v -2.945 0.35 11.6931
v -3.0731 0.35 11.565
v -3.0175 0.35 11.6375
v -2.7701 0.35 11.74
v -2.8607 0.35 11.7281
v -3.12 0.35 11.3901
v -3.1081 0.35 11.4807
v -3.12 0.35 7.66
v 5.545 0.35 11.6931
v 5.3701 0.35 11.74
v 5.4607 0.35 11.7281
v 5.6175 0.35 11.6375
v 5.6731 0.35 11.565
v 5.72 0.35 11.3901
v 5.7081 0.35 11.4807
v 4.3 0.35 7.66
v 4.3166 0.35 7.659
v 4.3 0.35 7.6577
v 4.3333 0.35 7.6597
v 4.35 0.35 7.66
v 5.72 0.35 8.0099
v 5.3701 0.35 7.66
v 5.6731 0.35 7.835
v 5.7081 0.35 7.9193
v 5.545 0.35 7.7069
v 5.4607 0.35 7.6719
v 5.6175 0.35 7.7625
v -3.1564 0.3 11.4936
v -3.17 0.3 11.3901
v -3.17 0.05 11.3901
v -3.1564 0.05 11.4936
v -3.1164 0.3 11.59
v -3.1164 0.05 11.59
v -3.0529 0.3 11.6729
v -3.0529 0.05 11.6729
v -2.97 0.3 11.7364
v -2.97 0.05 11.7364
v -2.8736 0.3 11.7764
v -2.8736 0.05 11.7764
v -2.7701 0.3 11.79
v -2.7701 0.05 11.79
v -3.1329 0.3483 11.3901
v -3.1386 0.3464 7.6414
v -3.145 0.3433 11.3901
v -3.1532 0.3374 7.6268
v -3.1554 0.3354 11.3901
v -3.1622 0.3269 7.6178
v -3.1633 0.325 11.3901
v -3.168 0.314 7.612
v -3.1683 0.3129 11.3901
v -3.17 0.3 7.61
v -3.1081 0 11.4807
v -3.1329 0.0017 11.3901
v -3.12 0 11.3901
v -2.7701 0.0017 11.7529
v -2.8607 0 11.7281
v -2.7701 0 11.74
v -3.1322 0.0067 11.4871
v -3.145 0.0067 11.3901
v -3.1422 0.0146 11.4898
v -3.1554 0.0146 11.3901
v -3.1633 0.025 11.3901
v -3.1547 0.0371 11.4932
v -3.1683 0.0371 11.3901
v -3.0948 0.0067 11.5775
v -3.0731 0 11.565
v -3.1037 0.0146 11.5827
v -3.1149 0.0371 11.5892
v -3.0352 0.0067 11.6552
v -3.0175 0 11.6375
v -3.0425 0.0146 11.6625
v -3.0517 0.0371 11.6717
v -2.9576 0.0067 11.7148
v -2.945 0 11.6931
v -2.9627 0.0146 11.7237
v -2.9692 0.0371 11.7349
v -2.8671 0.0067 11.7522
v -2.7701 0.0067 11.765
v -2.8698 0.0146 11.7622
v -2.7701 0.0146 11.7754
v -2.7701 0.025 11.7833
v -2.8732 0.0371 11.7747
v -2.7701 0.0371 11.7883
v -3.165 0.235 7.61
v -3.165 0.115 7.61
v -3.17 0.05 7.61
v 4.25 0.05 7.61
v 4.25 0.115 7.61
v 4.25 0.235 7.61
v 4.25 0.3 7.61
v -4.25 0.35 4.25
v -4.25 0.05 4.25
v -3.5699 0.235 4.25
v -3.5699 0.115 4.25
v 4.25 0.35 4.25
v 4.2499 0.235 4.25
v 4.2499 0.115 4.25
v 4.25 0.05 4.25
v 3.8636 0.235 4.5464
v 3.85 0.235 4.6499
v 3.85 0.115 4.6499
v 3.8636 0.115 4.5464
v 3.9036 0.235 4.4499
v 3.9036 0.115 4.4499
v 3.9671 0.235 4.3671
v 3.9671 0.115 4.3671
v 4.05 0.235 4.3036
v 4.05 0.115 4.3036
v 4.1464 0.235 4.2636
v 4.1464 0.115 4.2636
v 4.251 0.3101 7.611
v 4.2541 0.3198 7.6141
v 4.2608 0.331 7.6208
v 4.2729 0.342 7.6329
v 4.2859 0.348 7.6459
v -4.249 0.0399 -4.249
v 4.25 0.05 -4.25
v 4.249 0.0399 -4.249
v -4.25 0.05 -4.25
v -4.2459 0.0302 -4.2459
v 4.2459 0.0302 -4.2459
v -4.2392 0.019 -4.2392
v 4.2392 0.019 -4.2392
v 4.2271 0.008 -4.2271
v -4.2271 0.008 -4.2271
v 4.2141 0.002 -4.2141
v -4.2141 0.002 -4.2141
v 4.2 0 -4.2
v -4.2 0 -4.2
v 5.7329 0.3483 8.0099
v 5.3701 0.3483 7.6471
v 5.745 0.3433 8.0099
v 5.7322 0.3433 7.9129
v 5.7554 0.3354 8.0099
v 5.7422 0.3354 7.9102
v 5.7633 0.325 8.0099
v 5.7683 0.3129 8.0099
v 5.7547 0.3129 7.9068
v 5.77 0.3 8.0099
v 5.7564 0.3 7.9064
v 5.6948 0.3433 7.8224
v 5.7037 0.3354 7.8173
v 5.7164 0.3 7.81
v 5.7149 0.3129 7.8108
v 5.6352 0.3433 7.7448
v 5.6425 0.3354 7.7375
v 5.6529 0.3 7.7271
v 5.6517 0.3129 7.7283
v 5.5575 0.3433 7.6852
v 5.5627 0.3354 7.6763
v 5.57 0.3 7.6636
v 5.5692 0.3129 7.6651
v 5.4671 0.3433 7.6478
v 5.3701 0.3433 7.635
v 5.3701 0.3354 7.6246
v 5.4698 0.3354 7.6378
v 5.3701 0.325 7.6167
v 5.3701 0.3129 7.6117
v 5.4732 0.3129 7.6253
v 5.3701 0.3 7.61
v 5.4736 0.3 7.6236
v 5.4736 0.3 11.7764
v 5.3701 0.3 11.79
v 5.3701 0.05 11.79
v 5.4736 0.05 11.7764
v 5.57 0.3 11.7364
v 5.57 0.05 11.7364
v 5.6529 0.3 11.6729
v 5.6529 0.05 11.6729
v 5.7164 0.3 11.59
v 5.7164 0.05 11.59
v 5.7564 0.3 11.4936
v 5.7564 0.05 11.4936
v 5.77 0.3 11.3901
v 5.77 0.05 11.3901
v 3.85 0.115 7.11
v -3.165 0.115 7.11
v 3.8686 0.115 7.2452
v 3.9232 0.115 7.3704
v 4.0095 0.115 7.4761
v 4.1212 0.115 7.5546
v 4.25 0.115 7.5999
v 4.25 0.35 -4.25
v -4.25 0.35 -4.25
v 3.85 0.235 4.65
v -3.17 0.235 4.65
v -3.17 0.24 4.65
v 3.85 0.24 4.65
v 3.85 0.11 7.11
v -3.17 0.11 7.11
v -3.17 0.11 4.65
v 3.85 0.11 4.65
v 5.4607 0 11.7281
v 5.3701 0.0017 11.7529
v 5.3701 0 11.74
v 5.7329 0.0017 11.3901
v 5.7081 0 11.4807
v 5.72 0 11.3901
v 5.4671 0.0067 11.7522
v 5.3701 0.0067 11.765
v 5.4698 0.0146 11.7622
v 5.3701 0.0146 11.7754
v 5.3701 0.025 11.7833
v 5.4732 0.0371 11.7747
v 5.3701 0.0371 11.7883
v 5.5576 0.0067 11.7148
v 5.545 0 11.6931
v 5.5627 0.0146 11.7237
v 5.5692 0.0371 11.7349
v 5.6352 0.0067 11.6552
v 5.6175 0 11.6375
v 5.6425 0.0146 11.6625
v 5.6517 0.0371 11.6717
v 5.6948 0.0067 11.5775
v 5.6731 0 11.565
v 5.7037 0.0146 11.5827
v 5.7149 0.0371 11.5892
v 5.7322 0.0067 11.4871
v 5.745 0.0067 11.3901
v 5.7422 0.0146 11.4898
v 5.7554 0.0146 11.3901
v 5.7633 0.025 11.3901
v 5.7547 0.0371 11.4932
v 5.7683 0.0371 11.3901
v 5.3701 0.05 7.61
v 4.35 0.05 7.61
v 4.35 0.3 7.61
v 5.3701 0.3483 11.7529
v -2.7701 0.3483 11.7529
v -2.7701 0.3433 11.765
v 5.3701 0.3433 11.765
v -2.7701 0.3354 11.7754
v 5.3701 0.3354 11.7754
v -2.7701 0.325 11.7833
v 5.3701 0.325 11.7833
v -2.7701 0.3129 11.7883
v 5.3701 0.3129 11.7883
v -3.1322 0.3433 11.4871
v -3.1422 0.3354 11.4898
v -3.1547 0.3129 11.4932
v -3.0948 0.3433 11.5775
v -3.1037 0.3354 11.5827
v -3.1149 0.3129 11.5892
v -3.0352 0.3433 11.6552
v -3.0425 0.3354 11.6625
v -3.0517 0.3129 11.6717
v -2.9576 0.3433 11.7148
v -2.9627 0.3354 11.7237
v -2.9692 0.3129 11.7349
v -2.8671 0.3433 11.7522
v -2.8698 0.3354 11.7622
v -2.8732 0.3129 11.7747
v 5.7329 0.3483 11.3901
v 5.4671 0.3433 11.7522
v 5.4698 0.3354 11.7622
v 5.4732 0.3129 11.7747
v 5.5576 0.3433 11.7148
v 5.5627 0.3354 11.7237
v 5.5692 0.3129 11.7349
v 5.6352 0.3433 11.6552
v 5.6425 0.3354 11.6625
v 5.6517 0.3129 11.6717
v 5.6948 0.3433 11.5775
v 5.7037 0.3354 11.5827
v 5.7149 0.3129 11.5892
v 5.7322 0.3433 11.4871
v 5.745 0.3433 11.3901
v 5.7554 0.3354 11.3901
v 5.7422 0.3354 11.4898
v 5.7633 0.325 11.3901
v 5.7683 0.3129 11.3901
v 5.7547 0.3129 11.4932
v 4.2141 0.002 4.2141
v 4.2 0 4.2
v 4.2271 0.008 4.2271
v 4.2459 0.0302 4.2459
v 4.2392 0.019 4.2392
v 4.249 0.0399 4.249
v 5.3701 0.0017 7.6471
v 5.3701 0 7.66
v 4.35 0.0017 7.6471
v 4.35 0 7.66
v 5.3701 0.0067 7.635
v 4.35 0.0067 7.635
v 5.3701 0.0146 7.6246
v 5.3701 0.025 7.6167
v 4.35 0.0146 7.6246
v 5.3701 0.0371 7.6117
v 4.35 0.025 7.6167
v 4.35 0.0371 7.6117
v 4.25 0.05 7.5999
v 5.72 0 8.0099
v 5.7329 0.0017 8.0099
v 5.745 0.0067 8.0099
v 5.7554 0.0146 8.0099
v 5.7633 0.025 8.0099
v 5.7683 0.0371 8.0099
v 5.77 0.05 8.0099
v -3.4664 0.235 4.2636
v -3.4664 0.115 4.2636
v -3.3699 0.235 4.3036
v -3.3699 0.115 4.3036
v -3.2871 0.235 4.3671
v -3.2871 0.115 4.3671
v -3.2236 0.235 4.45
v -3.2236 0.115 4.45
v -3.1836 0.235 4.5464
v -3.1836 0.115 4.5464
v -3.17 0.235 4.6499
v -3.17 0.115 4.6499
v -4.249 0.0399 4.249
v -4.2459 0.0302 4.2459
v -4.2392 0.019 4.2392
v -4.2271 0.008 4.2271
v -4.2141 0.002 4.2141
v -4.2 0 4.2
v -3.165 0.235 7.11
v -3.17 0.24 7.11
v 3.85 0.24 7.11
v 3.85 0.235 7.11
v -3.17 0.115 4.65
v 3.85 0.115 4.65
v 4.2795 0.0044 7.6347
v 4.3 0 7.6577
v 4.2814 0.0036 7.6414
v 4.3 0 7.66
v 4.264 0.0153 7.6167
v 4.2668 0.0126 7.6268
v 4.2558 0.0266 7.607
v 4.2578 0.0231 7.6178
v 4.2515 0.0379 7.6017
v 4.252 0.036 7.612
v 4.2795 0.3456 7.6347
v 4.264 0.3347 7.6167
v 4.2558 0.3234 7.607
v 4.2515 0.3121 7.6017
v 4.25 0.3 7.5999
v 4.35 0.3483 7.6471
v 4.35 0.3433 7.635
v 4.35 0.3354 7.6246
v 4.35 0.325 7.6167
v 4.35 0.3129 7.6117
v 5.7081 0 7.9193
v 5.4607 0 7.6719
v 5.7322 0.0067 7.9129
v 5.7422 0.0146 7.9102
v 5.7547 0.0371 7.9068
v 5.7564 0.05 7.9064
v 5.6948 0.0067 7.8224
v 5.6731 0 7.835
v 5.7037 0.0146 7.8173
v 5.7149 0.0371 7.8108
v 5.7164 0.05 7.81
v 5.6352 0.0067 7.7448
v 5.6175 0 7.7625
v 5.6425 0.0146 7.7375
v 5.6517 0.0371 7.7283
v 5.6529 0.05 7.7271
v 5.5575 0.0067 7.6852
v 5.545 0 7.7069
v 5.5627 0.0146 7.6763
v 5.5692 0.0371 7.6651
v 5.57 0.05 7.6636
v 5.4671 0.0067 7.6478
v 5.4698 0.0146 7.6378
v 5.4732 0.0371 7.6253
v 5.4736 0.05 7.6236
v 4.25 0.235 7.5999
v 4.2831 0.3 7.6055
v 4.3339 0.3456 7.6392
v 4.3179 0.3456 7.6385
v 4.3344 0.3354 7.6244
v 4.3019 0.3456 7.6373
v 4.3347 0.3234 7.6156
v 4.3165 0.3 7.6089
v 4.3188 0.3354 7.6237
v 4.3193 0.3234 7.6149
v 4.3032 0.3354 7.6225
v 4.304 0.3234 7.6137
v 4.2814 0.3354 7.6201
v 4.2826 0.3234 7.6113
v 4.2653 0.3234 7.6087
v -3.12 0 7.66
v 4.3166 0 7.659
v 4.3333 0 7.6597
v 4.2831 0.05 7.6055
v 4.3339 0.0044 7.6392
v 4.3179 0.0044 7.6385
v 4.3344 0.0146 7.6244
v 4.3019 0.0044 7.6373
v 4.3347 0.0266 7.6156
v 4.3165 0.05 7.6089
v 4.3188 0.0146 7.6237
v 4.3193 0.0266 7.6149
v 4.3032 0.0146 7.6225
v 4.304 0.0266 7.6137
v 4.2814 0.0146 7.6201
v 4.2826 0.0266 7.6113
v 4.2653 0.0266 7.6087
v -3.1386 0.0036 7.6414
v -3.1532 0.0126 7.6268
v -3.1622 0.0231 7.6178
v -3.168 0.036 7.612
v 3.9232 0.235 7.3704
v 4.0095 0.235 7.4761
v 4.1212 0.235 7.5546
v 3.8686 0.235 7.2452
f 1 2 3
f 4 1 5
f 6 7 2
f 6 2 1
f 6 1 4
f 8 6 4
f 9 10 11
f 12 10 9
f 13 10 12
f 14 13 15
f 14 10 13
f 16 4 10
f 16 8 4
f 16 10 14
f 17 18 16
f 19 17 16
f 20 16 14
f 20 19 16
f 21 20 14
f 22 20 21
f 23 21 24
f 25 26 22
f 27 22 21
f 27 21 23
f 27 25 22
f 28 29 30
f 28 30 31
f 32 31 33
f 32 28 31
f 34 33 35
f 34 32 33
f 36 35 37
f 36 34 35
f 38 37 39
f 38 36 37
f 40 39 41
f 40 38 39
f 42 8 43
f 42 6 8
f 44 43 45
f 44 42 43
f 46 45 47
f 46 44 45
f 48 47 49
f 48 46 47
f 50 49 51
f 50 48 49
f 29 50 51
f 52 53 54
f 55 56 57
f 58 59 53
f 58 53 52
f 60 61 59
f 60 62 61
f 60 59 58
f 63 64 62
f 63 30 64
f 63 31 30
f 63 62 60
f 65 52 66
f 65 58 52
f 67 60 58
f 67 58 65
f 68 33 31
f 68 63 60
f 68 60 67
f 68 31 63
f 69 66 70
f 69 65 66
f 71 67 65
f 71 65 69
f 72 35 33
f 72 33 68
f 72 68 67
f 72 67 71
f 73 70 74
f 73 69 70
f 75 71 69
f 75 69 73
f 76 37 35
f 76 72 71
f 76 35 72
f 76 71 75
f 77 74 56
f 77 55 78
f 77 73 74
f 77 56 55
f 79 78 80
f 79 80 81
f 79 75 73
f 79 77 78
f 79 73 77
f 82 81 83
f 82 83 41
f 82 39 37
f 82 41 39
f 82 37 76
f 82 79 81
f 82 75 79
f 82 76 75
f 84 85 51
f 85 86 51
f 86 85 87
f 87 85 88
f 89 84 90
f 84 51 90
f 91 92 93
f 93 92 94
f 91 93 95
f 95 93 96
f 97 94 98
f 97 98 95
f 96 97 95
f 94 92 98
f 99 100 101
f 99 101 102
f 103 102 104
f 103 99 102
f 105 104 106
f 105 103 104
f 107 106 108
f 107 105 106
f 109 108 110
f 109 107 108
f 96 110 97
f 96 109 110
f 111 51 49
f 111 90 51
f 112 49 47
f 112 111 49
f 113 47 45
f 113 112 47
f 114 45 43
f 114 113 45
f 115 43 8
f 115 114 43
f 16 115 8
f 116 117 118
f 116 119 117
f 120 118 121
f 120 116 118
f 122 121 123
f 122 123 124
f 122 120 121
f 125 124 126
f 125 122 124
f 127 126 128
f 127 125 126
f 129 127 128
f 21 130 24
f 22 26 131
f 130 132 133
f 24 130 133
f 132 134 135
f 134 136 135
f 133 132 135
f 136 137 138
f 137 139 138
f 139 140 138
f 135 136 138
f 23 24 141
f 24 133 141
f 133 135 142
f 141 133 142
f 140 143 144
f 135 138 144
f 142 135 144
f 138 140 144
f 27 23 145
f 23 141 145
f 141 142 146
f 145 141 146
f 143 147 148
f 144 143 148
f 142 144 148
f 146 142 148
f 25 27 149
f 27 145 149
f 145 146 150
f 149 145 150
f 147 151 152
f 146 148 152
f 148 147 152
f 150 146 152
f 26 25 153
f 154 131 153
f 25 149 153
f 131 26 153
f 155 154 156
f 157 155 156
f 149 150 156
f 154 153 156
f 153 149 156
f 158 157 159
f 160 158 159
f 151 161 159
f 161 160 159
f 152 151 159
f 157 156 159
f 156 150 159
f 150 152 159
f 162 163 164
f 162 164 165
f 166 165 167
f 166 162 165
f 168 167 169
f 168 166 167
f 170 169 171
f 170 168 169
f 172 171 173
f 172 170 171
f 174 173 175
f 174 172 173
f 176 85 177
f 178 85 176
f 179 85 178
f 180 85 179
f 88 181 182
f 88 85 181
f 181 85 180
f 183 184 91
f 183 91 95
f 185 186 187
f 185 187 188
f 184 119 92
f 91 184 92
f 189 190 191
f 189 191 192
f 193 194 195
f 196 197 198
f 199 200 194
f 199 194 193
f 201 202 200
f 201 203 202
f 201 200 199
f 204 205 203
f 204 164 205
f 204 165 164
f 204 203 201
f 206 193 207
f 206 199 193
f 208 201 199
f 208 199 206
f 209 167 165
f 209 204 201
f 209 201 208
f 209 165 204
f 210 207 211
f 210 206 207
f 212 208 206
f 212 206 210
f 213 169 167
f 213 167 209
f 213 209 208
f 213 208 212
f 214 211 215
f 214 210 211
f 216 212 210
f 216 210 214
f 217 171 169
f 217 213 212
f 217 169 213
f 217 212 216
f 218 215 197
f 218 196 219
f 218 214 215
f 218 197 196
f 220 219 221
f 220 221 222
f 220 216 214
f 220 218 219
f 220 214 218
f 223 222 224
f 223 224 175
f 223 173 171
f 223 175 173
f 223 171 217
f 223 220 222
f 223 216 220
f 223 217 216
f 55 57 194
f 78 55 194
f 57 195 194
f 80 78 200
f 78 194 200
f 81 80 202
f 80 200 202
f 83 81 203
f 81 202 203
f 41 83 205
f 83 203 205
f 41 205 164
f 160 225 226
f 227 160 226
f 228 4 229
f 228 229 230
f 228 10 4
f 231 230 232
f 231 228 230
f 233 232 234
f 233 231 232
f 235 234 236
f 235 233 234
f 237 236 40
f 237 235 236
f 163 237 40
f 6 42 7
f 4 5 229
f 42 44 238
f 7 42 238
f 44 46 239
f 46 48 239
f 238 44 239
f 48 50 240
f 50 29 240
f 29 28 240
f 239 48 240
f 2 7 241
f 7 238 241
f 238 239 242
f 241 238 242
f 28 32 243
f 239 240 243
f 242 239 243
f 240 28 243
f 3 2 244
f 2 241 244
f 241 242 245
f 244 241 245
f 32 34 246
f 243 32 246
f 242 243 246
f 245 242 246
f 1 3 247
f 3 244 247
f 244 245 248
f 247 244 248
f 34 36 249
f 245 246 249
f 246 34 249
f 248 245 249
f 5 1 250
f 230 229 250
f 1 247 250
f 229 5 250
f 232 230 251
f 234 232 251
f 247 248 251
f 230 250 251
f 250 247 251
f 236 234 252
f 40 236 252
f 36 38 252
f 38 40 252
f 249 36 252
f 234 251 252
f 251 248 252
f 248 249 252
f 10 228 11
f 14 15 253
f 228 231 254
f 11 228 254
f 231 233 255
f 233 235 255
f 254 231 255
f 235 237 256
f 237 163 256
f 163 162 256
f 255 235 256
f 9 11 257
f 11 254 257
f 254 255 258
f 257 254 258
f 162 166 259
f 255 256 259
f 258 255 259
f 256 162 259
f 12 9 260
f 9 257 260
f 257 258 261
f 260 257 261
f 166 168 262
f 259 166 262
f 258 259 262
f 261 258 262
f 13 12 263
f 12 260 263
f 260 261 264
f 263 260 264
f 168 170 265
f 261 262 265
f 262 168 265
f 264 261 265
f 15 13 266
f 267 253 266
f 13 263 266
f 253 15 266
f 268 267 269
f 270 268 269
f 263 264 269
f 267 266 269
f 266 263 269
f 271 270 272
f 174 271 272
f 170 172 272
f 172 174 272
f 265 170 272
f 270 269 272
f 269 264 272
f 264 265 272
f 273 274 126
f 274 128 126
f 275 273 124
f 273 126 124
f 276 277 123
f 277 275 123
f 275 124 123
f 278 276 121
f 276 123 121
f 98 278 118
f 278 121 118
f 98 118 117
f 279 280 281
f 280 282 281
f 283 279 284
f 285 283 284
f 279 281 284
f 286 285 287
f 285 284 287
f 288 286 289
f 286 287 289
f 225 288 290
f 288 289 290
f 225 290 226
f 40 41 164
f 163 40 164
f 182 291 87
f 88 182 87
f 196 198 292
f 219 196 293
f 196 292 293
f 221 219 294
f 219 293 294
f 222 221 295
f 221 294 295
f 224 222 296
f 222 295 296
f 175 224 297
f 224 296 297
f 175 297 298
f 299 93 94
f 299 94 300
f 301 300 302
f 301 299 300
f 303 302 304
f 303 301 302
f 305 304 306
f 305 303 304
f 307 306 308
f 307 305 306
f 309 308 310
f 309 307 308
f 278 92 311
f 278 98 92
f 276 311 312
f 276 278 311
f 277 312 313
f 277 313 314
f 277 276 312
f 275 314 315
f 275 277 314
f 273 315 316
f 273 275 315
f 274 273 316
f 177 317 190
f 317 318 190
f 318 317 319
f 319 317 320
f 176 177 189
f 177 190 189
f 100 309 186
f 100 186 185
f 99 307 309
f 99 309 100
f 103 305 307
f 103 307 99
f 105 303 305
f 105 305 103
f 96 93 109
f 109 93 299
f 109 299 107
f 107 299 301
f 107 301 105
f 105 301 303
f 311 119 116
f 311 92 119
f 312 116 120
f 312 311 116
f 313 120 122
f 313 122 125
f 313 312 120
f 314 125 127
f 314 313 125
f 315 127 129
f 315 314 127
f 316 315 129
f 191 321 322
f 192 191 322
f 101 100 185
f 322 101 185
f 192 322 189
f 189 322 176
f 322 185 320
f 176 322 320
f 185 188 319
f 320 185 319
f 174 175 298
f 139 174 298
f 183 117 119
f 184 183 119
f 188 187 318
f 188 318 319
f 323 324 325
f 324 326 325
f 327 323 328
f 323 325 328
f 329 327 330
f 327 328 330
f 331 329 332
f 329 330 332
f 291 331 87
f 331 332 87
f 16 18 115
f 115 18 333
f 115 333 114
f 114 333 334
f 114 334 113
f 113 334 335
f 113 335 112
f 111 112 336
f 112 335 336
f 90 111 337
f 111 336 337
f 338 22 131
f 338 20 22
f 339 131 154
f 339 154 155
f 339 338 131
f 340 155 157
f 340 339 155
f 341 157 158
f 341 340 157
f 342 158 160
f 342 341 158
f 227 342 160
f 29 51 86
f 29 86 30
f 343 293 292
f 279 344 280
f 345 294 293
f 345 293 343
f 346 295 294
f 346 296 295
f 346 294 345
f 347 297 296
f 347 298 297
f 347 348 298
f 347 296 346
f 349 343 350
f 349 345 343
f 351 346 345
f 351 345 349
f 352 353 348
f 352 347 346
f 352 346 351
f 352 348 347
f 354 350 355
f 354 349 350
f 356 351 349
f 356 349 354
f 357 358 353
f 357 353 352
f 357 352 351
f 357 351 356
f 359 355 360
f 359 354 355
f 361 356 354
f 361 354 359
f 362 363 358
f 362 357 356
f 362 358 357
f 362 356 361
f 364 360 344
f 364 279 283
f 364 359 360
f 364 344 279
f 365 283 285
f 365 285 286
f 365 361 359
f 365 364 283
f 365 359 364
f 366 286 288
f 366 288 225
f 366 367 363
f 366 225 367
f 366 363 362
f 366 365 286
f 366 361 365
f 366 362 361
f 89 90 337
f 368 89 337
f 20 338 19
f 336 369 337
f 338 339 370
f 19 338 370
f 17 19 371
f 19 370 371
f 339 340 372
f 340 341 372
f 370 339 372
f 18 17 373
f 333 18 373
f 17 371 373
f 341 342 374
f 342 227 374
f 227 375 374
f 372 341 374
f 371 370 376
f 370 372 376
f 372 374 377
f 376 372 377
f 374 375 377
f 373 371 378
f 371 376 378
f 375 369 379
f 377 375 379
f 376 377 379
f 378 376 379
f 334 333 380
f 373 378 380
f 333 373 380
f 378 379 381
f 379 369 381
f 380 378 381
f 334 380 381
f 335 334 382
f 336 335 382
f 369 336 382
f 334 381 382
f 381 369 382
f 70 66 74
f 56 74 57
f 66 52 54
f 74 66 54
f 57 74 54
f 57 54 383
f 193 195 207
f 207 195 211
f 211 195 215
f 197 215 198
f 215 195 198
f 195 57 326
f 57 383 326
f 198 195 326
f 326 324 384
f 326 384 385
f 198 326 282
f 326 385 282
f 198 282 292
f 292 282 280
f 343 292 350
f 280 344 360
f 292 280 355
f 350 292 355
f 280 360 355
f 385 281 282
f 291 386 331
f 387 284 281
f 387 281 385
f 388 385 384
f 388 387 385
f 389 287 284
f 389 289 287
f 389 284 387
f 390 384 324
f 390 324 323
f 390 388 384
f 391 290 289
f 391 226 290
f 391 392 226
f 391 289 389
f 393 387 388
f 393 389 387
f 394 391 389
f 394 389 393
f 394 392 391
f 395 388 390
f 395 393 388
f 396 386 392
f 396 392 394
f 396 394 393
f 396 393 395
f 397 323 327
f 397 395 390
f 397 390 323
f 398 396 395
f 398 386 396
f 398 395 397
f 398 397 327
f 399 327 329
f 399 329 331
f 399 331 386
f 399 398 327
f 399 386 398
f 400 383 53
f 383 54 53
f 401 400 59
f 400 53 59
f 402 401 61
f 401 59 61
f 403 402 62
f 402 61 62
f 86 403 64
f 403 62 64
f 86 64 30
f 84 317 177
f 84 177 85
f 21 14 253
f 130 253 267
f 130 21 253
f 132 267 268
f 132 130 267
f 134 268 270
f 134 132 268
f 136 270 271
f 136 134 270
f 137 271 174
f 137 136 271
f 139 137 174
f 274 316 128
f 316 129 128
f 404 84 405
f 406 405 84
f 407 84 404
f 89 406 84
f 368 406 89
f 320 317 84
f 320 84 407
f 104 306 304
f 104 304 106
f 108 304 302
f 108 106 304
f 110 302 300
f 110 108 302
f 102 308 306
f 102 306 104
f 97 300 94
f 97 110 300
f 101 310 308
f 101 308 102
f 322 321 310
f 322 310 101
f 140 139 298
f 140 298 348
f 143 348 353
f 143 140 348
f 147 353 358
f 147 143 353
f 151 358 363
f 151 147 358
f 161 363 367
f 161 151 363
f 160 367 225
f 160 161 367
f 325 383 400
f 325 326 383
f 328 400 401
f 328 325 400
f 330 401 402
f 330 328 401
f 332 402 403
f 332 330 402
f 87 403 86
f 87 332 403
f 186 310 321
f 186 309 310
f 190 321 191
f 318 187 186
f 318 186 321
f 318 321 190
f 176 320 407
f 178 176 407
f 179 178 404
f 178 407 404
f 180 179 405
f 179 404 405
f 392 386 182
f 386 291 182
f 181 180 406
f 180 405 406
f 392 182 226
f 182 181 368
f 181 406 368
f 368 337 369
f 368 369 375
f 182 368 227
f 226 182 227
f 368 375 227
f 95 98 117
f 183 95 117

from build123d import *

# Parameters (mm, degrees)
BOSS_EXTRUDE1_DEPTH = 0.35
FILLET1_R           = 0.4
FILLET2_R           = 0.5
SKETCH4_W           = 8.5
SKETCH4_H           = 3.36
CUT_EXTRUDE1_DEPTH  = 0.115
SKETCH5_W           = 8.5
SKETCH5_H           = 3.36
CUT_EXTRUDE2_DEPTH  = 0.115
FILLET3_R           = 0.05
SKETCH8_W           = 7.02
SKETCH8_H           = 2.46
BOSS_EXTRUDE2_DEPTH = 0.005
SKETCH9_W           = 7.02
SKETCH9_H           = 2.46
BOSS_EXTRUDE3_DEPTH = 0.005
SKETCH10_W          = 0.5
SKETCH10_H          = 0.12
CUT_EXTRUDE3_DEPTH  = 0.005


with BuildPart() as part:
    # Sketch3 → Boss-Extrude1 (new body)
    with BuildSketch(Plane(origin=(0, 0, 0), x_dir=(1, 0, 0), z_dir=(0, 1, 0))):
        Polygon((-4.25, -4.25), (-3.17, -4.25), (-3.17, -11.79), (5.77, -11.79), (5.77, -7.61), (3.85, -7.61), (3.85, -4.25), (4.25, -4.25), (4.25, 4.25), (-4.25, 4.25), align=None)
    extrude(amount=BOSS_EXTRUDE1_DEPTH)

    # Fillet1
    fillet1_edges = [part.edges().sort_by_distance(p)[0] for p in [
        (5.77, 0.175, 11.79),
        (-3.17, 0.175, 11.79),
        (-3.17, 0.175, 4.25),
        (3.85, 0.175, 4.25),
        (5.77, 0.175, 7.61),
    ]]
    fillet(fillet1_edges, radius=FILLET1_R - 0.0001)  # a hair under: the kernel refuses the full size

    # Fillet2
    fillet2_edges = [part.edges().sort_by_distance(p)[0] for p in [
        (3.85, 0.175, 7.61),
    ]]
    fillet(fillet2_edges, radius=FILLET2_R)

    # Sketch4 → Cut-Extrude1 (cut)
    with BuildSketch(Plane(origin=(0, 0.35, 0), x_dir=(1, 0, 0), z_dir=(0, 1, 0))):
        with Locations((0, -5.93)):
            Rectangle(SKETCH4_W, SKETCH4_H)
    extrude(amount=-CUT_EXTRUDE1_DEPTH, mode=Mode.SUBTRACT)

    # Sketch5 → Cut-Extrude2 (cut)
    with BuildSketch(Plane.XZ):
        with Locations((0, 5.93)):
            Rectangle(SKETCH5_W, SKETCH5_H)
    extrude(amount=-CUT_EXTRUDE2_DEPTH, mode=Mode.SUBTRACT)

    # Fillet3
    fillet3_edges = [part.edges().sort_by_distance(p)[0] for p in [
        (-3.17, 0, 9.50005),
        (0.54, 0, 7.61),
        (4.25, 0, 7.604948974),
        (0, 0, 4.25),
        (-4.25, 0, 0),
        (0, 0, -4.25),
        (4.25, 0, 0),
        (4.86005, 0, 7.61),
        (4.86005, 0.35, 7.61),
        (5.77, 0, 9.7),
        (1.3, 0, 11.79),
        (-3.052872002, 0, 11.672872002),
        (5.652872002, 0, 11.672872002),
        (5.652872002, 0, 7.727127998),
        (5.77, 0.35, 9.7),
        (1.3, 0.35, 11.79),
        (-3.052872002, 0.35, 11.672872002),
        (5.652872002, 0.35, 11.672872002),
        (5.652872002, 0.35, 7.727127998),
        (4.299745519, 0.35, 7.607468077),
        (-3.17, 0.35, 9.50005),
        (0.54, 0.35, 7.61),
        (4.25, 0.35, 7.604948974),
        (4.299745519, 0, 7.607468077),
    ]]
    fillet(fillet3_edges, radius=FILLET3_R)

    # Sketch8 → Boss-Extrude2 (add)
    with BuildSketch(Plane(origin=(0, 0.235, 0), x_dir=(1, 0, 0), z_dir=(0, 1, 0))):
        with Locations((0.34, -5.88)):
            Rectangle(SKETCH8_W, SKETCH8_H)
    extrude(amount=BOSS_EXTRUDE2_DEPTH)

    # Sketch9 → Boss-Extrude3 (add)
    with BuildSketch(Plane.XZ.offset(-0.115)):
        with Locations((0.34, 5.88)):
            Rectangle(SKETCH9_W, SKETCH9_H)
    extrude(amount=BOSS_EXTRUDE3_DEPTH)

    # Sketch10 → Cut-Extrude3 (cut)
    with BuildSketch(Plane.ZY.offset(3.17)):
        with Locations((7.36, 0.175)):
            Rectangle(SKETCH10_W, SKETCH10_H)
    extrude(amount=-CUT_EXTRUDE3_DEPTH, mode=Mode.SUBTRACT)


solid = part.part
